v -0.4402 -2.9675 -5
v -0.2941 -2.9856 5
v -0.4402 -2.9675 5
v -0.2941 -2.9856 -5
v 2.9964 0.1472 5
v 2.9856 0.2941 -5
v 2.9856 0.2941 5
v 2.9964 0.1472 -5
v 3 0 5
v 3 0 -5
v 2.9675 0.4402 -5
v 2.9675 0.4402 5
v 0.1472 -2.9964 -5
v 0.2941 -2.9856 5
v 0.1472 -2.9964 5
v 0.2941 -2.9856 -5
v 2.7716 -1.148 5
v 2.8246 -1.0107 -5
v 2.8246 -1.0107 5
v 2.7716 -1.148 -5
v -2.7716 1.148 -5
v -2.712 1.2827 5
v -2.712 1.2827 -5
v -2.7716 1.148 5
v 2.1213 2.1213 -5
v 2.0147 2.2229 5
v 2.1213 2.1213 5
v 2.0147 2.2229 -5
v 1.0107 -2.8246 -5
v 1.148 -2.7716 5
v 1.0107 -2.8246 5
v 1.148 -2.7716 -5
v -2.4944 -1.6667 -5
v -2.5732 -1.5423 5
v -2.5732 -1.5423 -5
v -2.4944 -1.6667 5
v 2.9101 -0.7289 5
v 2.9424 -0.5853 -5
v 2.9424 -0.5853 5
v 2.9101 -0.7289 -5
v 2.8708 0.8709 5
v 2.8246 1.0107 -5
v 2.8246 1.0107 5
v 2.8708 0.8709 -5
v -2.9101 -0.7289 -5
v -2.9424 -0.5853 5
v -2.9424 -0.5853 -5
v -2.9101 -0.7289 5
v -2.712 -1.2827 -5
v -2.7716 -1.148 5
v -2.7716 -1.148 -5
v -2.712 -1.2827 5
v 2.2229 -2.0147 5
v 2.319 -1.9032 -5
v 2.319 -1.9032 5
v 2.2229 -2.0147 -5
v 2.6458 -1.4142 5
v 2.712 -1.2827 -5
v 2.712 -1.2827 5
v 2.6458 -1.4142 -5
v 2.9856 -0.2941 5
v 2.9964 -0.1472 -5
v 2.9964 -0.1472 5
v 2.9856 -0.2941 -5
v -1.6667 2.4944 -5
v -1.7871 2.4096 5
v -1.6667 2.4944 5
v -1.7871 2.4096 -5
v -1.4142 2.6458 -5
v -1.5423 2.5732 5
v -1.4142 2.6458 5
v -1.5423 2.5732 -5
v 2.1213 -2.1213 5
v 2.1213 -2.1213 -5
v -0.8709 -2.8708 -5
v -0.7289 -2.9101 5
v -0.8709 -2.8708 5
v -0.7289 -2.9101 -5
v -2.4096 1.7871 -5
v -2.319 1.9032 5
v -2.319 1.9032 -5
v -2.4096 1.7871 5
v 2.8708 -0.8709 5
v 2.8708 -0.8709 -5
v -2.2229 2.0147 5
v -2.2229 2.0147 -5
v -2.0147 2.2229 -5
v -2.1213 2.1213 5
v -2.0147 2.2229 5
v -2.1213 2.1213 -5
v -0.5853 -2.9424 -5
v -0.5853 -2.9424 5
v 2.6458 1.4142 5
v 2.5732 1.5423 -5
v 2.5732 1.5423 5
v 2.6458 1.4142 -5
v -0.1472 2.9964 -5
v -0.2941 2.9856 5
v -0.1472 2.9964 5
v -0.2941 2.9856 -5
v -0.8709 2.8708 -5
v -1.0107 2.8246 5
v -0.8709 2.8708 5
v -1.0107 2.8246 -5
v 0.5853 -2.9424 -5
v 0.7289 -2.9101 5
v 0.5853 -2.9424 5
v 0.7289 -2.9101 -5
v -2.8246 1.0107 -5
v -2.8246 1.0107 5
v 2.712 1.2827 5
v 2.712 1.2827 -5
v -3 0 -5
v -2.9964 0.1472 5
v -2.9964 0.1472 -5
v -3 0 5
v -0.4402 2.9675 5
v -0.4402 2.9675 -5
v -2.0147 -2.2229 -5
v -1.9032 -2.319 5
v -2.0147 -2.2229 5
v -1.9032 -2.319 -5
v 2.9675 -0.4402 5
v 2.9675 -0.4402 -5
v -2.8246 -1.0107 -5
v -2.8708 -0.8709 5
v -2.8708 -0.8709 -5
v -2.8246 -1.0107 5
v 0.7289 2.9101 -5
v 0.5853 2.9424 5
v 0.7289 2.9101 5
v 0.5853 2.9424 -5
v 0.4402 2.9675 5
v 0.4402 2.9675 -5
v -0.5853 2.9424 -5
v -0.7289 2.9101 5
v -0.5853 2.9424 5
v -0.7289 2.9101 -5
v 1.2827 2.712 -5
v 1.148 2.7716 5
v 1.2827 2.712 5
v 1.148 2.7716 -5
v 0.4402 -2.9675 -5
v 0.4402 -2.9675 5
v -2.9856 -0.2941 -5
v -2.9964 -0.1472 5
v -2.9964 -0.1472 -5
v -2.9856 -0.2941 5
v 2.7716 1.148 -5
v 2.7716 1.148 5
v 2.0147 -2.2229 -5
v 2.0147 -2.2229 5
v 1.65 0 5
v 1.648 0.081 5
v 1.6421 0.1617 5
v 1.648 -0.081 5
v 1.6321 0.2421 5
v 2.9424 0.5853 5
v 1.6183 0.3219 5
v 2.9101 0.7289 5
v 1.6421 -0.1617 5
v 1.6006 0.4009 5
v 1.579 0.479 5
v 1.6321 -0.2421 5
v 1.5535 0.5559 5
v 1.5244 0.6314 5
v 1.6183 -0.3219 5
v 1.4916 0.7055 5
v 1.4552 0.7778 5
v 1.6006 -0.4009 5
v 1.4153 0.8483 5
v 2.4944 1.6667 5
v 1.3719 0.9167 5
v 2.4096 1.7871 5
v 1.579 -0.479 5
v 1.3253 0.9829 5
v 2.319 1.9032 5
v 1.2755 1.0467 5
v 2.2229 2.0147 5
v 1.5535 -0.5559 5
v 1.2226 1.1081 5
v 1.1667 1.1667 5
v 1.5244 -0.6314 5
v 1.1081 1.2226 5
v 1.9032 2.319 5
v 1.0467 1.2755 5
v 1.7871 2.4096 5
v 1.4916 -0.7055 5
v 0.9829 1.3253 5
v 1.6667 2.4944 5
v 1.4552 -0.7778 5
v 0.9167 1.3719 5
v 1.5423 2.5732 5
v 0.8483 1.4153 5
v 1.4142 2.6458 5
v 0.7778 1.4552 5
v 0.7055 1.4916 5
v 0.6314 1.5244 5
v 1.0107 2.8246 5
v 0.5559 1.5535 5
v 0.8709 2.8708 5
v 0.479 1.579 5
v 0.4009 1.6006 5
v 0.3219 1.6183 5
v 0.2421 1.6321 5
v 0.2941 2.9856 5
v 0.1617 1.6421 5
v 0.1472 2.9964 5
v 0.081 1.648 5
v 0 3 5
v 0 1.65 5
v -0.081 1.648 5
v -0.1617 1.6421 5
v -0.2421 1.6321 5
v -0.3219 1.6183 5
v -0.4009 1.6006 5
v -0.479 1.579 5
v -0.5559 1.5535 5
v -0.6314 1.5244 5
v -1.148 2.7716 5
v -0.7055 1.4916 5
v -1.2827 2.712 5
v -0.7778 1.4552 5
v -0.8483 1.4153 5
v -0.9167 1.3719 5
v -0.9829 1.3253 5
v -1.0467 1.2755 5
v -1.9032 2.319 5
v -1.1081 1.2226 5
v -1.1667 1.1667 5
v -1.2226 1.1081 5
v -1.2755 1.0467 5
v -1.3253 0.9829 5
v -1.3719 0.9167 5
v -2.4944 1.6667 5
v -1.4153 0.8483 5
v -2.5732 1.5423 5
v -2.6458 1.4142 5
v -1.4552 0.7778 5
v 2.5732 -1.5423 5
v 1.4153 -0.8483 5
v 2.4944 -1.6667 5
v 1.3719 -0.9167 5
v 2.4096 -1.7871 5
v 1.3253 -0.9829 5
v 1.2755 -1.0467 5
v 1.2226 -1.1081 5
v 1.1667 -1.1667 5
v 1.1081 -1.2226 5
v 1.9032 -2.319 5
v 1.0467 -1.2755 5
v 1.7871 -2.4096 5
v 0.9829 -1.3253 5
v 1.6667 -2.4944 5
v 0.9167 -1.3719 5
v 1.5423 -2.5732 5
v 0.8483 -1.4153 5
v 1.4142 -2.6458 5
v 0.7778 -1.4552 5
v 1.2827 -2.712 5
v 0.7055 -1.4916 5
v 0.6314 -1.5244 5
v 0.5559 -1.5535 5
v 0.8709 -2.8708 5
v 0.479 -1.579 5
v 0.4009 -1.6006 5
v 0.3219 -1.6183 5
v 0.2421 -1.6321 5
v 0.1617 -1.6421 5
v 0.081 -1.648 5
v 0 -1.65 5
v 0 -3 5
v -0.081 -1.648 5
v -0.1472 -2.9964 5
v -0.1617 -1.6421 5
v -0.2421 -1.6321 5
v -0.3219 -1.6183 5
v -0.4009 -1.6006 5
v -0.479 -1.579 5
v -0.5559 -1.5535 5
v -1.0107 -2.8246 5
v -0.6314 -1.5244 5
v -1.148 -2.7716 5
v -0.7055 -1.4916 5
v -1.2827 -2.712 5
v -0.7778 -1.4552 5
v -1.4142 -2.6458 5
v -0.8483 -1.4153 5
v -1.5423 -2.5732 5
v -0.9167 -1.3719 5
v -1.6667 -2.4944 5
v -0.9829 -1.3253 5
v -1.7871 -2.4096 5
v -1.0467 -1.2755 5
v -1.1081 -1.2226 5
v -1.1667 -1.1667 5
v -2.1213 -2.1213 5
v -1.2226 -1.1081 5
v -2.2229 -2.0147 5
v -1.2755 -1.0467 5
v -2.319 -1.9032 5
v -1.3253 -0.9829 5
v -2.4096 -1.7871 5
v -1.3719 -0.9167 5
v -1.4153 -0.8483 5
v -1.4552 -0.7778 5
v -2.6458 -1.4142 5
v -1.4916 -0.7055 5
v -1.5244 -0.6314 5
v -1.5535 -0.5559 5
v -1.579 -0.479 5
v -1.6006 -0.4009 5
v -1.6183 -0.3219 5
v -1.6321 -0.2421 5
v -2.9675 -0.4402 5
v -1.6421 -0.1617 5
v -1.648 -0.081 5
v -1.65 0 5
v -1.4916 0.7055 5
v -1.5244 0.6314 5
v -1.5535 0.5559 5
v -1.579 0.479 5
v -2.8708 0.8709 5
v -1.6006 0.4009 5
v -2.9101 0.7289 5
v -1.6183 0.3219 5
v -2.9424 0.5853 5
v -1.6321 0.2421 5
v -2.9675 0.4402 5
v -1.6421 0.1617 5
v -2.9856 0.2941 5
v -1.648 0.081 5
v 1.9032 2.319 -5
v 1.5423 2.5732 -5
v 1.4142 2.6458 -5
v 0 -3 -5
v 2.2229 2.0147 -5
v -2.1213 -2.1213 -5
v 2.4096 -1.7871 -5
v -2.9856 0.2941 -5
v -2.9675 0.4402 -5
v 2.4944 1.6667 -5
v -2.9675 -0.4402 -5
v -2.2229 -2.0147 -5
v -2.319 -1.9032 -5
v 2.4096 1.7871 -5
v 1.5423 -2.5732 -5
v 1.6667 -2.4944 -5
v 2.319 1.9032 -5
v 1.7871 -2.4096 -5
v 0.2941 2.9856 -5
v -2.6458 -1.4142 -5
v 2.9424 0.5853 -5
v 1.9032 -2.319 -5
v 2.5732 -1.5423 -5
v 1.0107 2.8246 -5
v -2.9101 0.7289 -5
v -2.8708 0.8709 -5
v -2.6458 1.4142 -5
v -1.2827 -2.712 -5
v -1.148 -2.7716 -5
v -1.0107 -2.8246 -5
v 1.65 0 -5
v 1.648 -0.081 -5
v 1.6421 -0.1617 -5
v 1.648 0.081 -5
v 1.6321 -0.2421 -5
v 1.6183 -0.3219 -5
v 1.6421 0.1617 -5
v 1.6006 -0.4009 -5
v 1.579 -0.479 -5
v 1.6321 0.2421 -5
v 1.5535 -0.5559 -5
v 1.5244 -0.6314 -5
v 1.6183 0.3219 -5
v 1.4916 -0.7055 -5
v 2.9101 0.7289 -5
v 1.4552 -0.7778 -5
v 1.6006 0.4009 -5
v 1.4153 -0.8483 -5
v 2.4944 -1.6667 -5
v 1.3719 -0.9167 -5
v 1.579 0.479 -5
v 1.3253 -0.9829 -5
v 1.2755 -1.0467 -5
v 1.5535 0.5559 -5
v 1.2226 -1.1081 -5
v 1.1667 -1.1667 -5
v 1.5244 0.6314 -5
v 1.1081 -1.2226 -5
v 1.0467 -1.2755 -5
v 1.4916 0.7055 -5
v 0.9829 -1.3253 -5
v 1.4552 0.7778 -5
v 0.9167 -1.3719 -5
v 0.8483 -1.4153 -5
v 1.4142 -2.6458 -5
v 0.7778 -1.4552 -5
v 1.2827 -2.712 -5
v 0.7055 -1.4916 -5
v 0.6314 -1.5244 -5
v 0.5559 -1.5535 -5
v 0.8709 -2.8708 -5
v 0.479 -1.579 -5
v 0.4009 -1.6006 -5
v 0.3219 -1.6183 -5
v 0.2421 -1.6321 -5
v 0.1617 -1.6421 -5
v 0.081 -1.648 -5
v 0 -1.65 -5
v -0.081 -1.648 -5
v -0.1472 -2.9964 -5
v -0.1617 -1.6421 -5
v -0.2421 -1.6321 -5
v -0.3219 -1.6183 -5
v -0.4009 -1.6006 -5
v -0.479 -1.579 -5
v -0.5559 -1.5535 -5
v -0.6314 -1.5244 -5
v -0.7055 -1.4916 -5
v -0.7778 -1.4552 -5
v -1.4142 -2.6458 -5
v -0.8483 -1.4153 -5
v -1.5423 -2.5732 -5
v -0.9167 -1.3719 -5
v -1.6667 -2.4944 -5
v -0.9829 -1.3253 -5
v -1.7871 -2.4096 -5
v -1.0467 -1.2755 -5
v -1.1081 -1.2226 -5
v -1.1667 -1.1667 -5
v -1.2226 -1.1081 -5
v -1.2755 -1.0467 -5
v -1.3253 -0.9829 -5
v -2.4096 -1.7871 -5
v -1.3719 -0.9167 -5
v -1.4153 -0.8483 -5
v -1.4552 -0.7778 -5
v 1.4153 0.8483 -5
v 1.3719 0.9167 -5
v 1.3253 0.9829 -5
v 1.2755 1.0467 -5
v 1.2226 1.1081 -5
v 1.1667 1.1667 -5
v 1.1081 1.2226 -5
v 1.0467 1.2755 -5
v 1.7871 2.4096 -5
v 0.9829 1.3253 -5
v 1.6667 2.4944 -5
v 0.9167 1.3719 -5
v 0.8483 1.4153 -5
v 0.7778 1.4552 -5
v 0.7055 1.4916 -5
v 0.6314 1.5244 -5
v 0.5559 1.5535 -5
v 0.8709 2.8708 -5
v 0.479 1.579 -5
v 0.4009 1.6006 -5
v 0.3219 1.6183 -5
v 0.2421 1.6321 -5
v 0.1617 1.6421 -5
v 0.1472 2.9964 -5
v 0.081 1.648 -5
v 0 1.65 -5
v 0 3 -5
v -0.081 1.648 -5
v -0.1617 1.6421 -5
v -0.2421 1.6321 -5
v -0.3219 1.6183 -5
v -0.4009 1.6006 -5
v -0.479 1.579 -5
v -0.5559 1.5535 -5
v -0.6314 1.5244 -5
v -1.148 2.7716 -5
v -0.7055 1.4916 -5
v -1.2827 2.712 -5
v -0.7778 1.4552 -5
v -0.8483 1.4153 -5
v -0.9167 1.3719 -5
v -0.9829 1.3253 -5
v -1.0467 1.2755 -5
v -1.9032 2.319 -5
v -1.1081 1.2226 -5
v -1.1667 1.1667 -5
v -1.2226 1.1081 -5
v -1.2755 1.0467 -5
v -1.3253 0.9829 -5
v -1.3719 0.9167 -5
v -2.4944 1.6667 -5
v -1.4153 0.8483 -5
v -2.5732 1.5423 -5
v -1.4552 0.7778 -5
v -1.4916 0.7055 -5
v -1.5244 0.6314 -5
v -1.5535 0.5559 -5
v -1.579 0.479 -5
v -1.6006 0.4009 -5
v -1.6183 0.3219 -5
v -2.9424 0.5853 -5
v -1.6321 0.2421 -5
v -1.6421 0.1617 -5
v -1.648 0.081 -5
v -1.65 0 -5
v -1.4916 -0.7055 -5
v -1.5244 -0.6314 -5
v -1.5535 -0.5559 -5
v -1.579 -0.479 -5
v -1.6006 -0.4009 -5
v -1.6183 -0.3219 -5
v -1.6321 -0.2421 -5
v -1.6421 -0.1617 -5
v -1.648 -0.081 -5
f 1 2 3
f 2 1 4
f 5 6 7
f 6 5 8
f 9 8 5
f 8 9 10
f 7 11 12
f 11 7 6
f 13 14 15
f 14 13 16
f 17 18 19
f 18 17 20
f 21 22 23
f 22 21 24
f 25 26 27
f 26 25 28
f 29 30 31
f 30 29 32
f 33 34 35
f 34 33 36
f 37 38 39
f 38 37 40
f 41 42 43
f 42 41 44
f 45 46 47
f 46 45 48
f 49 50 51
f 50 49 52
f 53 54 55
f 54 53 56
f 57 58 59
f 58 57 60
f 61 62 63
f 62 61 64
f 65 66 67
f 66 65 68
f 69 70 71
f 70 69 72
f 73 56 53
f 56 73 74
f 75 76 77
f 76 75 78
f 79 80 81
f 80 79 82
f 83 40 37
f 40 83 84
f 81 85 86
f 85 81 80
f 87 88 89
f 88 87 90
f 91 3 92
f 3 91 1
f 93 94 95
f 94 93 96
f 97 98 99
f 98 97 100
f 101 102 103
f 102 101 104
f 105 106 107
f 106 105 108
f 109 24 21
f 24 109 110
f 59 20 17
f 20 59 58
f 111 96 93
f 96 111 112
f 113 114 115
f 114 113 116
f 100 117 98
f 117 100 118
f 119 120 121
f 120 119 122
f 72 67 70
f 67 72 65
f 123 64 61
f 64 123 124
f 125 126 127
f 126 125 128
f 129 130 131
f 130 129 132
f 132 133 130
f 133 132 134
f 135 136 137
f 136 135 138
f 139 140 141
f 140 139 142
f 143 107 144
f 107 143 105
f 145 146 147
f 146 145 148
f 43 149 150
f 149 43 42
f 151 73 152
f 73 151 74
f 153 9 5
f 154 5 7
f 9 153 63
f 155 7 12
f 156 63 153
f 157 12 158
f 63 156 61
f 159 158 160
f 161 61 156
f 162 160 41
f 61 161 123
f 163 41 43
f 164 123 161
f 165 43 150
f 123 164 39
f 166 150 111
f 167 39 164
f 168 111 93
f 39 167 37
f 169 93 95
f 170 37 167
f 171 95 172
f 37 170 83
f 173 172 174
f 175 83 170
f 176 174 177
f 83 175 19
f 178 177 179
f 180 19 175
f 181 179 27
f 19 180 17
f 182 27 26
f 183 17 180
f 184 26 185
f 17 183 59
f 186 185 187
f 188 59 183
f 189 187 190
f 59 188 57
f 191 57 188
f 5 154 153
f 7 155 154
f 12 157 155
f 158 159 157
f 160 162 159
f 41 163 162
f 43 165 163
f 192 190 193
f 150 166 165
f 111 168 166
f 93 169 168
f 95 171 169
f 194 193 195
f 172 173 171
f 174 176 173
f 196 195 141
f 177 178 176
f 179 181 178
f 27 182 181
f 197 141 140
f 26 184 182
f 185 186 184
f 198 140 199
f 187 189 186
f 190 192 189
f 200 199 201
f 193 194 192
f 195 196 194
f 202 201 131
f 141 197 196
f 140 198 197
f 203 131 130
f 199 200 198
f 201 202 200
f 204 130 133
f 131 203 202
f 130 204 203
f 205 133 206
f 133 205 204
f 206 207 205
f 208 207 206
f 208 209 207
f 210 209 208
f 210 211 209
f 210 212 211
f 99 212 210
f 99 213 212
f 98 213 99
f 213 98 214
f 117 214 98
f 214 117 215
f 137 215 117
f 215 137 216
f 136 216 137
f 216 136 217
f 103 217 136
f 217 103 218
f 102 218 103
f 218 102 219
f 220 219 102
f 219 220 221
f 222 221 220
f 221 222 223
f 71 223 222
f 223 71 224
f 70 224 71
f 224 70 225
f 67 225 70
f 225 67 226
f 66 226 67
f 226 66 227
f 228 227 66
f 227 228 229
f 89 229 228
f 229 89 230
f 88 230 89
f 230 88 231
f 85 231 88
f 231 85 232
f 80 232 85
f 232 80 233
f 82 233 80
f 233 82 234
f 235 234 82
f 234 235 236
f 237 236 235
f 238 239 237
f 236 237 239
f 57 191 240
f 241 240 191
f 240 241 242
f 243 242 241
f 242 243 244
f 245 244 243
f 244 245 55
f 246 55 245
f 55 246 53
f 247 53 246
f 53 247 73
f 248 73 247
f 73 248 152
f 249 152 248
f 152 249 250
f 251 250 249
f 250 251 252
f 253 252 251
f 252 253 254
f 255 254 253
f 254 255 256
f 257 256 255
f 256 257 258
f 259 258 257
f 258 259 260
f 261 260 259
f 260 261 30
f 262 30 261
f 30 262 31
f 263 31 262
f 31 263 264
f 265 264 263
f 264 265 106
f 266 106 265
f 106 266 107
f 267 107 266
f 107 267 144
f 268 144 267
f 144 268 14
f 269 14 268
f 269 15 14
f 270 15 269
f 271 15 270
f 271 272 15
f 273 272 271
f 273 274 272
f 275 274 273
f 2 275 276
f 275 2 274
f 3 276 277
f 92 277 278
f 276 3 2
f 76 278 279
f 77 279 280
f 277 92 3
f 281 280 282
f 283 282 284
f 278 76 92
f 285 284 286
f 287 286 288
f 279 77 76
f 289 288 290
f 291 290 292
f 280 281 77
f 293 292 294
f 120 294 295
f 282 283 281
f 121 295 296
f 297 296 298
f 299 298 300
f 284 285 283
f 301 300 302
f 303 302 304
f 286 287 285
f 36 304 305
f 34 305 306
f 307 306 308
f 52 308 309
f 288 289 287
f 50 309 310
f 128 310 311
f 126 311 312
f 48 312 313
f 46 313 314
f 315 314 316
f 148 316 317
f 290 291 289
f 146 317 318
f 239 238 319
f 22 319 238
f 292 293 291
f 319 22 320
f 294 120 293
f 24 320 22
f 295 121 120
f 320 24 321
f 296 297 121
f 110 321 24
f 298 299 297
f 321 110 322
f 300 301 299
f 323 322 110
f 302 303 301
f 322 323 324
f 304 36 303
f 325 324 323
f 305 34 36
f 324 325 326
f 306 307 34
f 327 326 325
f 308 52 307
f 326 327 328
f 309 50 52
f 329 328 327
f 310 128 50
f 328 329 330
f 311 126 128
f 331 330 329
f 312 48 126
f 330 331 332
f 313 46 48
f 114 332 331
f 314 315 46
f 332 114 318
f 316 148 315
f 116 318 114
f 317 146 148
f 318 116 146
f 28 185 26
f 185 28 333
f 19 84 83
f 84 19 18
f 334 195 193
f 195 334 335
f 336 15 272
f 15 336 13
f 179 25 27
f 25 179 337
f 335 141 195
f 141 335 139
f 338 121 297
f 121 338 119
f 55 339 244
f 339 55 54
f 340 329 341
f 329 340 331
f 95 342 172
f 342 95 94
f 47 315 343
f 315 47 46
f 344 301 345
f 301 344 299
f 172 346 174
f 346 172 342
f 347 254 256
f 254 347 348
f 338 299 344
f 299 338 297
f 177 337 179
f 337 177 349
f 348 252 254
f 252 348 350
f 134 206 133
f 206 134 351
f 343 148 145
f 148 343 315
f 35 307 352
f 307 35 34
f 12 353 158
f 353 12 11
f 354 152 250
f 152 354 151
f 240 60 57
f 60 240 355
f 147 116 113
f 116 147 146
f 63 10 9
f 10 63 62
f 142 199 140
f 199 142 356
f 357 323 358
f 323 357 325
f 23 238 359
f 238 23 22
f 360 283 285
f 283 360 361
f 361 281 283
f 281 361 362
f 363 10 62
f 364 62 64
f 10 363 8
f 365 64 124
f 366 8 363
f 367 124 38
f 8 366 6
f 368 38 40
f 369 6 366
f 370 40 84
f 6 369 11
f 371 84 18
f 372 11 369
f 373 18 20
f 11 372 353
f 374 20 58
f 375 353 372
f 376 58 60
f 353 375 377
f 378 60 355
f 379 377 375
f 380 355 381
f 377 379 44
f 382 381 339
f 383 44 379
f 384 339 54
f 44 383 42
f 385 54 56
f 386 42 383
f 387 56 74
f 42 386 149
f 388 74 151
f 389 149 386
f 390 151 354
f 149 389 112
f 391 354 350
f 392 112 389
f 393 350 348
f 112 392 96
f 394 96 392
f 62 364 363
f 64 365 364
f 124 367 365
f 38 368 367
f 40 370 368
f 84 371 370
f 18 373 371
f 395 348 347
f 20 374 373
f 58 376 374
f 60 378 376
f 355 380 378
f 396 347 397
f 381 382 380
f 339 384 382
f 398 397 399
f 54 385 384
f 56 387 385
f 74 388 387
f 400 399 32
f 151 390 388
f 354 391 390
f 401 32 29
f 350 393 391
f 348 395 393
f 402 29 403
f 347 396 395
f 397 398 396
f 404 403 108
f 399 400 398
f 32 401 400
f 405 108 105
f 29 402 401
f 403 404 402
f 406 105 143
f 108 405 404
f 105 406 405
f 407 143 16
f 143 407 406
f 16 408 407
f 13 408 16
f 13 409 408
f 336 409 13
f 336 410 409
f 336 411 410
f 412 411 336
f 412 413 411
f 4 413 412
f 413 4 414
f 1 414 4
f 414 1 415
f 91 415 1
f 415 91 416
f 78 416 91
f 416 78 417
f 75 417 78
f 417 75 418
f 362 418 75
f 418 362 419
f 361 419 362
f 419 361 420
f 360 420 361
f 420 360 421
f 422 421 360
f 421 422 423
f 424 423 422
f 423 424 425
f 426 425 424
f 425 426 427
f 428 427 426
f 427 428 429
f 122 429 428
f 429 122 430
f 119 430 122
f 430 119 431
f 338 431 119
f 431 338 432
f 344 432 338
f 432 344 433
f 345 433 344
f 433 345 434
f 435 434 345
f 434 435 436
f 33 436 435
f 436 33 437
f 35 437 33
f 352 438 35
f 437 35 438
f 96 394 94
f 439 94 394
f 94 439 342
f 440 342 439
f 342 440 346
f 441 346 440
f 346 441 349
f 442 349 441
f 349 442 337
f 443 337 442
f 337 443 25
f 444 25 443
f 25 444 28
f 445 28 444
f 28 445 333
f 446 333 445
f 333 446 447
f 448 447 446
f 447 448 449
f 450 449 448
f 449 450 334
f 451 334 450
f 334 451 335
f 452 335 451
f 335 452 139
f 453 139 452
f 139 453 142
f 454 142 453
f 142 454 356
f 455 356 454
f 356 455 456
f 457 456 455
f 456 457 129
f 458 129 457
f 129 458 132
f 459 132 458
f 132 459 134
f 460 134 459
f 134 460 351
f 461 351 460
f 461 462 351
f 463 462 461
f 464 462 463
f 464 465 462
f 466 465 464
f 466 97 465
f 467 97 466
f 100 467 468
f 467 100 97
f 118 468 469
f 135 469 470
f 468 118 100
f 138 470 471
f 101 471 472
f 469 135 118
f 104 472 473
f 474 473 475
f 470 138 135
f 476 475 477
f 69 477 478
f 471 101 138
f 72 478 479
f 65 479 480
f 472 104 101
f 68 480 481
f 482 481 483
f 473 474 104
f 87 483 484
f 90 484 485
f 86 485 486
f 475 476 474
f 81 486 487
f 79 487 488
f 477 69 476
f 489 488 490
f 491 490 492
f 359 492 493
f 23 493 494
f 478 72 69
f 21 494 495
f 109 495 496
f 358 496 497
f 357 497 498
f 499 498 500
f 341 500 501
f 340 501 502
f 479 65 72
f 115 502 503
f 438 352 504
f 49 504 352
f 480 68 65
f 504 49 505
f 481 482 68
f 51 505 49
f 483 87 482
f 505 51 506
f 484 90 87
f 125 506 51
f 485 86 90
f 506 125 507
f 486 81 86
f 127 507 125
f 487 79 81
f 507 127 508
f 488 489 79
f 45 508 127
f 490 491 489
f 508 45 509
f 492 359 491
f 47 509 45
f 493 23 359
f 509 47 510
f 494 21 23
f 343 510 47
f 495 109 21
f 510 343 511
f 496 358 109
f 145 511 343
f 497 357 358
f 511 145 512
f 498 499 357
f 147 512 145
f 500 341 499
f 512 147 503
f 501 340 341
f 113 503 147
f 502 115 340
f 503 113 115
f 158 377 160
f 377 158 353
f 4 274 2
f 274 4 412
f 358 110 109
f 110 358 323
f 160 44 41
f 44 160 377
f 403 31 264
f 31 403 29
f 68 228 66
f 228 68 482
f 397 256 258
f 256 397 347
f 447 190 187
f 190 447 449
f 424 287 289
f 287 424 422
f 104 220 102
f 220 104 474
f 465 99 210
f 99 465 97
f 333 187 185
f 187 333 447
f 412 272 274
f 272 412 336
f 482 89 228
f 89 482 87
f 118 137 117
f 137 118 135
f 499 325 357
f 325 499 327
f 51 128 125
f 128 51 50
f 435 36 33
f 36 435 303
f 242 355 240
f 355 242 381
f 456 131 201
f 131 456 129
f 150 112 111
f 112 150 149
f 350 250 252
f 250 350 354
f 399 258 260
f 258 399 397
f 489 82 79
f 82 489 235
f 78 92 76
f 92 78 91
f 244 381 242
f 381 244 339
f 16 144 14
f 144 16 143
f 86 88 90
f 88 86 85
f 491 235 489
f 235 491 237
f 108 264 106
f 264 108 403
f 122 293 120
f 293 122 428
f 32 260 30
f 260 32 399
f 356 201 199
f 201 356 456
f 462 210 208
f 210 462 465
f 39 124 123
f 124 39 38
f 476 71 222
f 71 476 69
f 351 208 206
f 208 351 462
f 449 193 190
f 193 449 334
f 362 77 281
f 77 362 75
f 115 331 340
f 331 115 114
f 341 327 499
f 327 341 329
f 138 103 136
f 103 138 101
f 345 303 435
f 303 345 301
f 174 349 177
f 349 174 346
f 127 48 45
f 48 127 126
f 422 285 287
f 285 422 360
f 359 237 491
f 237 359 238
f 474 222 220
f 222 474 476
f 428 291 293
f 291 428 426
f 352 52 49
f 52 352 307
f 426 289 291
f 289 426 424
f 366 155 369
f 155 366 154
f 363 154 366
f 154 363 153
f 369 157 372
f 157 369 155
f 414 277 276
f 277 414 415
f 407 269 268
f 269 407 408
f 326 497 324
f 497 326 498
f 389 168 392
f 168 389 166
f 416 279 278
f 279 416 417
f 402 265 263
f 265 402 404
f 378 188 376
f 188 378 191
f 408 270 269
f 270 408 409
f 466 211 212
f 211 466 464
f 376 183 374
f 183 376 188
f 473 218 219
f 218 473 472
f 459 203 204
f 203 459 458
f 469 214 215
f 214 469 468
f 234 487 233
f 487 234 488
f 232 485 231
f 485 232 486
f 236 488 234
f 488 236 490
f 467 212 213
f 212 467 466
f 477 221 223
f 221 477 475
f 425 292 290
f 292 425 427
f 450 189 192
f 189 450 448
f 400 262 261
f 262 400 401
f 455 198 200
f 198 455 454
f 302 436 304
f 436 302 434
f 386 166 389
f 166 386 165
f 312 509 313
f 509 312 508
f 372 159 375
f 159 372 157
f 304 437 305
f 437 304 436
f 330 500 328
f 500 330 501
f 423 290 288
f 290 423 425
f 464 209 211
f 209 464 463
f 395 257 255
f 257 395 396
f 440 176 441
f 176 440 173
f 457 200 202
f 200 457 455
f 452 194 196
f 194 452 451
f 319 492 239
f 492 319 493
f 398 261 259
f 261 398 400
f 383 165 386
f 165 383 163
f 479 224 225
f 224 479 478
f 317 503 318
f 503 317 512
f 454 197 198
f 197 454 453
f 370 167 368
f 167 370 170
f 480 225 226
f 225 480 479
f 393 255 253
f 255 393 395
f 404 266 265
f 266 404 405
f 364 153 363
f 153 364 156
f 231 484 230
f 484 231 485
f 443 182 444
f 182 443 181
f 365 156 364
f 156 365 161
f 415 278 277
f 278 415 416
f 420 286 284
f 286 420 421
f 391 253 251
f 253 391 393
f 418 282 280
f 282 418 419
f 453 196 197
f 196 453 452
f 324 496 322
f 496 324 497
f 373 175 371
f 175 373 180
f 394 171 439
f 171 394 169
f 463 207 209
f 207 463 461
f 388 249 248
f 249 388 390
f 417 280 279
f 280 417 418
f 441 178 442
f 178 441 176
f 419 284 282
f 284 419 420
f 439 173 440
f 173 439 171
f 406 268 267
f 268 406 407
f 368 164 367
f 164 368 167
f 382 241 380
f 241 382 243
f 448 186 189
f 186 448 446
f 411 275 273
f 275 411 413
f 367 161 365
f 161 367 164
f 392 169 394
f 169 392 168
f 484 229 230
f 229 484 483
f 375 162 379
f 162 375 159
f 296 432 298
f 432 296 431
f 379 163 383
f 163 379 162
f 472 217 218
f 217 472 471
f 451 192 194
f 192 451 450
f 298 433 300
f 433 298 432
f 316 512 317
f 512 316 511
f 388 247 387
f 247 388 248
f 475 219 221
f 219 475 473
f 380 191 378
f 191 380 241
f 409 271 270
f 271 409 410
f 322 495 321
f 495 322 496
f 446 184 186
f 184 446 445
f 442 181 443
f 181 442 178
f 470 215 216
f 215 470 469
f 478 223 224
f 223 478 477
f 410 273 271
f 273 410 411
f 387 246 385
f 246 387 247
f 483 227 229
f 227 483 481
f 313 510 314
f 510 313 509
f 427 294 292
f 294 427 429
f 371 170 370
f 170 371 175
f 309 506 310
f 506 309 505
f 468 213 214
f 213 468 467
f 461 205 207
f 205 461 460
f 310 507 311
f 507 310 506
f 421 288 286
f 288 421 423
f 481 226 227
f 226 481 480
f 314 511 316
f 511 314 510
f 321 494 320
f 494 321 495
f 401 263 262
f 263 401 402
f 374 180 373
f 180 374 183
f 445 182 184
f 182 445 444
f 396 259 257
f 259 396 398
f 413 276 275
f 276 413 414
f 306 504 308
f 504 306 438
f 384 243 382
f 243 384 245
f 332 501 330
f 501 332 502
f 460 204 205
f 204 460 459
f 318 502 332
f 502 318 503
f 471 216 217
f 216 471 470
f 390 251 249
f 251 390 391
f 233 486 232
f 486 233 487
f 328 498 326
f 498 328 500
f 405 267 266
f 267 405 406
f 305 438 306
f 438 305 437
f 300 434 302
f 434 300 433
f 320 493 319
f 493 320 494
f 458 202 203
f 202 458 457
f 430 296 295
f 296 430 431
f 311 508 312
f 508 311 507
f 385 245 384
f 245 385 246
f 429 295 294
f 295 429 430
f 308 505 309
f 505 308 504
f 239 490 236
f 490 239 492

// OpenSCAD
// Standoff pillar (spacer body with THROUGH bore for M3 screw)
// Spec: 3.0mm thread (interpreted as M3 clearance bore), 10.0mm long, outer diameter unspecified
// Model is ONE connected solid (a hollow standoff body).

thread_diameter_mm = 3.0;   // M3 nominal -> use as through-bore diameter
length_mm = 10.0;
outer_diameter_mm = 6.0;    // reasonable default since diameter is unspecified
overlap_mm = 0.2;

$fn = 128;

module standoff_pillar() {
    body_h = length_mm;
    body_r = outer_diameter_mm/2;

    // Clearance bore for M3 (slightly larger than 3.0mm so it behaves like a standoff)
    bore_d = thread_diameter_mm + 0.3;
    bore_r = bore_d/2;

    // Small end chamfers
    chamfer_h = min(0.8, body_h/4);
    chamfer_r_drop = 0.4;

    // Ensure printable wall thickness
    min_wall = 1.0;
    body_r_safe = max(body_r, bore_r + min_wall);

    difference() {
        // Outer body with chamfered ends (single connected solid)
        union() {
            // Main cylinder
            cylinder(h=body_h, r=body_r_safe, center=true);

            // Top chamfer (overlaps into main body)
            translate([0, 0, body_h/2 - chamfer_h/2 - overlap_mm/2])
                cylinder(h=chamfer_h + overlap_mm, r1=body_r_safe, r2=max(body_r_safe - chamfer_r_drop, 0.1), center=true);

            // Bottom chamfer (overlaps into main body)
            translate([0, 0, -body_h/2 + chamfer_h/2 + overlap_mm/2])
                cylinder(h=chamfer_h + overlap_mm, r1=max(body_r_safe - chamfer_r_drop, 0.1), r2=body_r_safe, center=true);
        }

        // Through bore (slightly longer to guarantee clean cut)
        cylinder(h=body_h + 2*overlap_mm, r=bore_r, center=true);
    }
}

standoff_pillar();
